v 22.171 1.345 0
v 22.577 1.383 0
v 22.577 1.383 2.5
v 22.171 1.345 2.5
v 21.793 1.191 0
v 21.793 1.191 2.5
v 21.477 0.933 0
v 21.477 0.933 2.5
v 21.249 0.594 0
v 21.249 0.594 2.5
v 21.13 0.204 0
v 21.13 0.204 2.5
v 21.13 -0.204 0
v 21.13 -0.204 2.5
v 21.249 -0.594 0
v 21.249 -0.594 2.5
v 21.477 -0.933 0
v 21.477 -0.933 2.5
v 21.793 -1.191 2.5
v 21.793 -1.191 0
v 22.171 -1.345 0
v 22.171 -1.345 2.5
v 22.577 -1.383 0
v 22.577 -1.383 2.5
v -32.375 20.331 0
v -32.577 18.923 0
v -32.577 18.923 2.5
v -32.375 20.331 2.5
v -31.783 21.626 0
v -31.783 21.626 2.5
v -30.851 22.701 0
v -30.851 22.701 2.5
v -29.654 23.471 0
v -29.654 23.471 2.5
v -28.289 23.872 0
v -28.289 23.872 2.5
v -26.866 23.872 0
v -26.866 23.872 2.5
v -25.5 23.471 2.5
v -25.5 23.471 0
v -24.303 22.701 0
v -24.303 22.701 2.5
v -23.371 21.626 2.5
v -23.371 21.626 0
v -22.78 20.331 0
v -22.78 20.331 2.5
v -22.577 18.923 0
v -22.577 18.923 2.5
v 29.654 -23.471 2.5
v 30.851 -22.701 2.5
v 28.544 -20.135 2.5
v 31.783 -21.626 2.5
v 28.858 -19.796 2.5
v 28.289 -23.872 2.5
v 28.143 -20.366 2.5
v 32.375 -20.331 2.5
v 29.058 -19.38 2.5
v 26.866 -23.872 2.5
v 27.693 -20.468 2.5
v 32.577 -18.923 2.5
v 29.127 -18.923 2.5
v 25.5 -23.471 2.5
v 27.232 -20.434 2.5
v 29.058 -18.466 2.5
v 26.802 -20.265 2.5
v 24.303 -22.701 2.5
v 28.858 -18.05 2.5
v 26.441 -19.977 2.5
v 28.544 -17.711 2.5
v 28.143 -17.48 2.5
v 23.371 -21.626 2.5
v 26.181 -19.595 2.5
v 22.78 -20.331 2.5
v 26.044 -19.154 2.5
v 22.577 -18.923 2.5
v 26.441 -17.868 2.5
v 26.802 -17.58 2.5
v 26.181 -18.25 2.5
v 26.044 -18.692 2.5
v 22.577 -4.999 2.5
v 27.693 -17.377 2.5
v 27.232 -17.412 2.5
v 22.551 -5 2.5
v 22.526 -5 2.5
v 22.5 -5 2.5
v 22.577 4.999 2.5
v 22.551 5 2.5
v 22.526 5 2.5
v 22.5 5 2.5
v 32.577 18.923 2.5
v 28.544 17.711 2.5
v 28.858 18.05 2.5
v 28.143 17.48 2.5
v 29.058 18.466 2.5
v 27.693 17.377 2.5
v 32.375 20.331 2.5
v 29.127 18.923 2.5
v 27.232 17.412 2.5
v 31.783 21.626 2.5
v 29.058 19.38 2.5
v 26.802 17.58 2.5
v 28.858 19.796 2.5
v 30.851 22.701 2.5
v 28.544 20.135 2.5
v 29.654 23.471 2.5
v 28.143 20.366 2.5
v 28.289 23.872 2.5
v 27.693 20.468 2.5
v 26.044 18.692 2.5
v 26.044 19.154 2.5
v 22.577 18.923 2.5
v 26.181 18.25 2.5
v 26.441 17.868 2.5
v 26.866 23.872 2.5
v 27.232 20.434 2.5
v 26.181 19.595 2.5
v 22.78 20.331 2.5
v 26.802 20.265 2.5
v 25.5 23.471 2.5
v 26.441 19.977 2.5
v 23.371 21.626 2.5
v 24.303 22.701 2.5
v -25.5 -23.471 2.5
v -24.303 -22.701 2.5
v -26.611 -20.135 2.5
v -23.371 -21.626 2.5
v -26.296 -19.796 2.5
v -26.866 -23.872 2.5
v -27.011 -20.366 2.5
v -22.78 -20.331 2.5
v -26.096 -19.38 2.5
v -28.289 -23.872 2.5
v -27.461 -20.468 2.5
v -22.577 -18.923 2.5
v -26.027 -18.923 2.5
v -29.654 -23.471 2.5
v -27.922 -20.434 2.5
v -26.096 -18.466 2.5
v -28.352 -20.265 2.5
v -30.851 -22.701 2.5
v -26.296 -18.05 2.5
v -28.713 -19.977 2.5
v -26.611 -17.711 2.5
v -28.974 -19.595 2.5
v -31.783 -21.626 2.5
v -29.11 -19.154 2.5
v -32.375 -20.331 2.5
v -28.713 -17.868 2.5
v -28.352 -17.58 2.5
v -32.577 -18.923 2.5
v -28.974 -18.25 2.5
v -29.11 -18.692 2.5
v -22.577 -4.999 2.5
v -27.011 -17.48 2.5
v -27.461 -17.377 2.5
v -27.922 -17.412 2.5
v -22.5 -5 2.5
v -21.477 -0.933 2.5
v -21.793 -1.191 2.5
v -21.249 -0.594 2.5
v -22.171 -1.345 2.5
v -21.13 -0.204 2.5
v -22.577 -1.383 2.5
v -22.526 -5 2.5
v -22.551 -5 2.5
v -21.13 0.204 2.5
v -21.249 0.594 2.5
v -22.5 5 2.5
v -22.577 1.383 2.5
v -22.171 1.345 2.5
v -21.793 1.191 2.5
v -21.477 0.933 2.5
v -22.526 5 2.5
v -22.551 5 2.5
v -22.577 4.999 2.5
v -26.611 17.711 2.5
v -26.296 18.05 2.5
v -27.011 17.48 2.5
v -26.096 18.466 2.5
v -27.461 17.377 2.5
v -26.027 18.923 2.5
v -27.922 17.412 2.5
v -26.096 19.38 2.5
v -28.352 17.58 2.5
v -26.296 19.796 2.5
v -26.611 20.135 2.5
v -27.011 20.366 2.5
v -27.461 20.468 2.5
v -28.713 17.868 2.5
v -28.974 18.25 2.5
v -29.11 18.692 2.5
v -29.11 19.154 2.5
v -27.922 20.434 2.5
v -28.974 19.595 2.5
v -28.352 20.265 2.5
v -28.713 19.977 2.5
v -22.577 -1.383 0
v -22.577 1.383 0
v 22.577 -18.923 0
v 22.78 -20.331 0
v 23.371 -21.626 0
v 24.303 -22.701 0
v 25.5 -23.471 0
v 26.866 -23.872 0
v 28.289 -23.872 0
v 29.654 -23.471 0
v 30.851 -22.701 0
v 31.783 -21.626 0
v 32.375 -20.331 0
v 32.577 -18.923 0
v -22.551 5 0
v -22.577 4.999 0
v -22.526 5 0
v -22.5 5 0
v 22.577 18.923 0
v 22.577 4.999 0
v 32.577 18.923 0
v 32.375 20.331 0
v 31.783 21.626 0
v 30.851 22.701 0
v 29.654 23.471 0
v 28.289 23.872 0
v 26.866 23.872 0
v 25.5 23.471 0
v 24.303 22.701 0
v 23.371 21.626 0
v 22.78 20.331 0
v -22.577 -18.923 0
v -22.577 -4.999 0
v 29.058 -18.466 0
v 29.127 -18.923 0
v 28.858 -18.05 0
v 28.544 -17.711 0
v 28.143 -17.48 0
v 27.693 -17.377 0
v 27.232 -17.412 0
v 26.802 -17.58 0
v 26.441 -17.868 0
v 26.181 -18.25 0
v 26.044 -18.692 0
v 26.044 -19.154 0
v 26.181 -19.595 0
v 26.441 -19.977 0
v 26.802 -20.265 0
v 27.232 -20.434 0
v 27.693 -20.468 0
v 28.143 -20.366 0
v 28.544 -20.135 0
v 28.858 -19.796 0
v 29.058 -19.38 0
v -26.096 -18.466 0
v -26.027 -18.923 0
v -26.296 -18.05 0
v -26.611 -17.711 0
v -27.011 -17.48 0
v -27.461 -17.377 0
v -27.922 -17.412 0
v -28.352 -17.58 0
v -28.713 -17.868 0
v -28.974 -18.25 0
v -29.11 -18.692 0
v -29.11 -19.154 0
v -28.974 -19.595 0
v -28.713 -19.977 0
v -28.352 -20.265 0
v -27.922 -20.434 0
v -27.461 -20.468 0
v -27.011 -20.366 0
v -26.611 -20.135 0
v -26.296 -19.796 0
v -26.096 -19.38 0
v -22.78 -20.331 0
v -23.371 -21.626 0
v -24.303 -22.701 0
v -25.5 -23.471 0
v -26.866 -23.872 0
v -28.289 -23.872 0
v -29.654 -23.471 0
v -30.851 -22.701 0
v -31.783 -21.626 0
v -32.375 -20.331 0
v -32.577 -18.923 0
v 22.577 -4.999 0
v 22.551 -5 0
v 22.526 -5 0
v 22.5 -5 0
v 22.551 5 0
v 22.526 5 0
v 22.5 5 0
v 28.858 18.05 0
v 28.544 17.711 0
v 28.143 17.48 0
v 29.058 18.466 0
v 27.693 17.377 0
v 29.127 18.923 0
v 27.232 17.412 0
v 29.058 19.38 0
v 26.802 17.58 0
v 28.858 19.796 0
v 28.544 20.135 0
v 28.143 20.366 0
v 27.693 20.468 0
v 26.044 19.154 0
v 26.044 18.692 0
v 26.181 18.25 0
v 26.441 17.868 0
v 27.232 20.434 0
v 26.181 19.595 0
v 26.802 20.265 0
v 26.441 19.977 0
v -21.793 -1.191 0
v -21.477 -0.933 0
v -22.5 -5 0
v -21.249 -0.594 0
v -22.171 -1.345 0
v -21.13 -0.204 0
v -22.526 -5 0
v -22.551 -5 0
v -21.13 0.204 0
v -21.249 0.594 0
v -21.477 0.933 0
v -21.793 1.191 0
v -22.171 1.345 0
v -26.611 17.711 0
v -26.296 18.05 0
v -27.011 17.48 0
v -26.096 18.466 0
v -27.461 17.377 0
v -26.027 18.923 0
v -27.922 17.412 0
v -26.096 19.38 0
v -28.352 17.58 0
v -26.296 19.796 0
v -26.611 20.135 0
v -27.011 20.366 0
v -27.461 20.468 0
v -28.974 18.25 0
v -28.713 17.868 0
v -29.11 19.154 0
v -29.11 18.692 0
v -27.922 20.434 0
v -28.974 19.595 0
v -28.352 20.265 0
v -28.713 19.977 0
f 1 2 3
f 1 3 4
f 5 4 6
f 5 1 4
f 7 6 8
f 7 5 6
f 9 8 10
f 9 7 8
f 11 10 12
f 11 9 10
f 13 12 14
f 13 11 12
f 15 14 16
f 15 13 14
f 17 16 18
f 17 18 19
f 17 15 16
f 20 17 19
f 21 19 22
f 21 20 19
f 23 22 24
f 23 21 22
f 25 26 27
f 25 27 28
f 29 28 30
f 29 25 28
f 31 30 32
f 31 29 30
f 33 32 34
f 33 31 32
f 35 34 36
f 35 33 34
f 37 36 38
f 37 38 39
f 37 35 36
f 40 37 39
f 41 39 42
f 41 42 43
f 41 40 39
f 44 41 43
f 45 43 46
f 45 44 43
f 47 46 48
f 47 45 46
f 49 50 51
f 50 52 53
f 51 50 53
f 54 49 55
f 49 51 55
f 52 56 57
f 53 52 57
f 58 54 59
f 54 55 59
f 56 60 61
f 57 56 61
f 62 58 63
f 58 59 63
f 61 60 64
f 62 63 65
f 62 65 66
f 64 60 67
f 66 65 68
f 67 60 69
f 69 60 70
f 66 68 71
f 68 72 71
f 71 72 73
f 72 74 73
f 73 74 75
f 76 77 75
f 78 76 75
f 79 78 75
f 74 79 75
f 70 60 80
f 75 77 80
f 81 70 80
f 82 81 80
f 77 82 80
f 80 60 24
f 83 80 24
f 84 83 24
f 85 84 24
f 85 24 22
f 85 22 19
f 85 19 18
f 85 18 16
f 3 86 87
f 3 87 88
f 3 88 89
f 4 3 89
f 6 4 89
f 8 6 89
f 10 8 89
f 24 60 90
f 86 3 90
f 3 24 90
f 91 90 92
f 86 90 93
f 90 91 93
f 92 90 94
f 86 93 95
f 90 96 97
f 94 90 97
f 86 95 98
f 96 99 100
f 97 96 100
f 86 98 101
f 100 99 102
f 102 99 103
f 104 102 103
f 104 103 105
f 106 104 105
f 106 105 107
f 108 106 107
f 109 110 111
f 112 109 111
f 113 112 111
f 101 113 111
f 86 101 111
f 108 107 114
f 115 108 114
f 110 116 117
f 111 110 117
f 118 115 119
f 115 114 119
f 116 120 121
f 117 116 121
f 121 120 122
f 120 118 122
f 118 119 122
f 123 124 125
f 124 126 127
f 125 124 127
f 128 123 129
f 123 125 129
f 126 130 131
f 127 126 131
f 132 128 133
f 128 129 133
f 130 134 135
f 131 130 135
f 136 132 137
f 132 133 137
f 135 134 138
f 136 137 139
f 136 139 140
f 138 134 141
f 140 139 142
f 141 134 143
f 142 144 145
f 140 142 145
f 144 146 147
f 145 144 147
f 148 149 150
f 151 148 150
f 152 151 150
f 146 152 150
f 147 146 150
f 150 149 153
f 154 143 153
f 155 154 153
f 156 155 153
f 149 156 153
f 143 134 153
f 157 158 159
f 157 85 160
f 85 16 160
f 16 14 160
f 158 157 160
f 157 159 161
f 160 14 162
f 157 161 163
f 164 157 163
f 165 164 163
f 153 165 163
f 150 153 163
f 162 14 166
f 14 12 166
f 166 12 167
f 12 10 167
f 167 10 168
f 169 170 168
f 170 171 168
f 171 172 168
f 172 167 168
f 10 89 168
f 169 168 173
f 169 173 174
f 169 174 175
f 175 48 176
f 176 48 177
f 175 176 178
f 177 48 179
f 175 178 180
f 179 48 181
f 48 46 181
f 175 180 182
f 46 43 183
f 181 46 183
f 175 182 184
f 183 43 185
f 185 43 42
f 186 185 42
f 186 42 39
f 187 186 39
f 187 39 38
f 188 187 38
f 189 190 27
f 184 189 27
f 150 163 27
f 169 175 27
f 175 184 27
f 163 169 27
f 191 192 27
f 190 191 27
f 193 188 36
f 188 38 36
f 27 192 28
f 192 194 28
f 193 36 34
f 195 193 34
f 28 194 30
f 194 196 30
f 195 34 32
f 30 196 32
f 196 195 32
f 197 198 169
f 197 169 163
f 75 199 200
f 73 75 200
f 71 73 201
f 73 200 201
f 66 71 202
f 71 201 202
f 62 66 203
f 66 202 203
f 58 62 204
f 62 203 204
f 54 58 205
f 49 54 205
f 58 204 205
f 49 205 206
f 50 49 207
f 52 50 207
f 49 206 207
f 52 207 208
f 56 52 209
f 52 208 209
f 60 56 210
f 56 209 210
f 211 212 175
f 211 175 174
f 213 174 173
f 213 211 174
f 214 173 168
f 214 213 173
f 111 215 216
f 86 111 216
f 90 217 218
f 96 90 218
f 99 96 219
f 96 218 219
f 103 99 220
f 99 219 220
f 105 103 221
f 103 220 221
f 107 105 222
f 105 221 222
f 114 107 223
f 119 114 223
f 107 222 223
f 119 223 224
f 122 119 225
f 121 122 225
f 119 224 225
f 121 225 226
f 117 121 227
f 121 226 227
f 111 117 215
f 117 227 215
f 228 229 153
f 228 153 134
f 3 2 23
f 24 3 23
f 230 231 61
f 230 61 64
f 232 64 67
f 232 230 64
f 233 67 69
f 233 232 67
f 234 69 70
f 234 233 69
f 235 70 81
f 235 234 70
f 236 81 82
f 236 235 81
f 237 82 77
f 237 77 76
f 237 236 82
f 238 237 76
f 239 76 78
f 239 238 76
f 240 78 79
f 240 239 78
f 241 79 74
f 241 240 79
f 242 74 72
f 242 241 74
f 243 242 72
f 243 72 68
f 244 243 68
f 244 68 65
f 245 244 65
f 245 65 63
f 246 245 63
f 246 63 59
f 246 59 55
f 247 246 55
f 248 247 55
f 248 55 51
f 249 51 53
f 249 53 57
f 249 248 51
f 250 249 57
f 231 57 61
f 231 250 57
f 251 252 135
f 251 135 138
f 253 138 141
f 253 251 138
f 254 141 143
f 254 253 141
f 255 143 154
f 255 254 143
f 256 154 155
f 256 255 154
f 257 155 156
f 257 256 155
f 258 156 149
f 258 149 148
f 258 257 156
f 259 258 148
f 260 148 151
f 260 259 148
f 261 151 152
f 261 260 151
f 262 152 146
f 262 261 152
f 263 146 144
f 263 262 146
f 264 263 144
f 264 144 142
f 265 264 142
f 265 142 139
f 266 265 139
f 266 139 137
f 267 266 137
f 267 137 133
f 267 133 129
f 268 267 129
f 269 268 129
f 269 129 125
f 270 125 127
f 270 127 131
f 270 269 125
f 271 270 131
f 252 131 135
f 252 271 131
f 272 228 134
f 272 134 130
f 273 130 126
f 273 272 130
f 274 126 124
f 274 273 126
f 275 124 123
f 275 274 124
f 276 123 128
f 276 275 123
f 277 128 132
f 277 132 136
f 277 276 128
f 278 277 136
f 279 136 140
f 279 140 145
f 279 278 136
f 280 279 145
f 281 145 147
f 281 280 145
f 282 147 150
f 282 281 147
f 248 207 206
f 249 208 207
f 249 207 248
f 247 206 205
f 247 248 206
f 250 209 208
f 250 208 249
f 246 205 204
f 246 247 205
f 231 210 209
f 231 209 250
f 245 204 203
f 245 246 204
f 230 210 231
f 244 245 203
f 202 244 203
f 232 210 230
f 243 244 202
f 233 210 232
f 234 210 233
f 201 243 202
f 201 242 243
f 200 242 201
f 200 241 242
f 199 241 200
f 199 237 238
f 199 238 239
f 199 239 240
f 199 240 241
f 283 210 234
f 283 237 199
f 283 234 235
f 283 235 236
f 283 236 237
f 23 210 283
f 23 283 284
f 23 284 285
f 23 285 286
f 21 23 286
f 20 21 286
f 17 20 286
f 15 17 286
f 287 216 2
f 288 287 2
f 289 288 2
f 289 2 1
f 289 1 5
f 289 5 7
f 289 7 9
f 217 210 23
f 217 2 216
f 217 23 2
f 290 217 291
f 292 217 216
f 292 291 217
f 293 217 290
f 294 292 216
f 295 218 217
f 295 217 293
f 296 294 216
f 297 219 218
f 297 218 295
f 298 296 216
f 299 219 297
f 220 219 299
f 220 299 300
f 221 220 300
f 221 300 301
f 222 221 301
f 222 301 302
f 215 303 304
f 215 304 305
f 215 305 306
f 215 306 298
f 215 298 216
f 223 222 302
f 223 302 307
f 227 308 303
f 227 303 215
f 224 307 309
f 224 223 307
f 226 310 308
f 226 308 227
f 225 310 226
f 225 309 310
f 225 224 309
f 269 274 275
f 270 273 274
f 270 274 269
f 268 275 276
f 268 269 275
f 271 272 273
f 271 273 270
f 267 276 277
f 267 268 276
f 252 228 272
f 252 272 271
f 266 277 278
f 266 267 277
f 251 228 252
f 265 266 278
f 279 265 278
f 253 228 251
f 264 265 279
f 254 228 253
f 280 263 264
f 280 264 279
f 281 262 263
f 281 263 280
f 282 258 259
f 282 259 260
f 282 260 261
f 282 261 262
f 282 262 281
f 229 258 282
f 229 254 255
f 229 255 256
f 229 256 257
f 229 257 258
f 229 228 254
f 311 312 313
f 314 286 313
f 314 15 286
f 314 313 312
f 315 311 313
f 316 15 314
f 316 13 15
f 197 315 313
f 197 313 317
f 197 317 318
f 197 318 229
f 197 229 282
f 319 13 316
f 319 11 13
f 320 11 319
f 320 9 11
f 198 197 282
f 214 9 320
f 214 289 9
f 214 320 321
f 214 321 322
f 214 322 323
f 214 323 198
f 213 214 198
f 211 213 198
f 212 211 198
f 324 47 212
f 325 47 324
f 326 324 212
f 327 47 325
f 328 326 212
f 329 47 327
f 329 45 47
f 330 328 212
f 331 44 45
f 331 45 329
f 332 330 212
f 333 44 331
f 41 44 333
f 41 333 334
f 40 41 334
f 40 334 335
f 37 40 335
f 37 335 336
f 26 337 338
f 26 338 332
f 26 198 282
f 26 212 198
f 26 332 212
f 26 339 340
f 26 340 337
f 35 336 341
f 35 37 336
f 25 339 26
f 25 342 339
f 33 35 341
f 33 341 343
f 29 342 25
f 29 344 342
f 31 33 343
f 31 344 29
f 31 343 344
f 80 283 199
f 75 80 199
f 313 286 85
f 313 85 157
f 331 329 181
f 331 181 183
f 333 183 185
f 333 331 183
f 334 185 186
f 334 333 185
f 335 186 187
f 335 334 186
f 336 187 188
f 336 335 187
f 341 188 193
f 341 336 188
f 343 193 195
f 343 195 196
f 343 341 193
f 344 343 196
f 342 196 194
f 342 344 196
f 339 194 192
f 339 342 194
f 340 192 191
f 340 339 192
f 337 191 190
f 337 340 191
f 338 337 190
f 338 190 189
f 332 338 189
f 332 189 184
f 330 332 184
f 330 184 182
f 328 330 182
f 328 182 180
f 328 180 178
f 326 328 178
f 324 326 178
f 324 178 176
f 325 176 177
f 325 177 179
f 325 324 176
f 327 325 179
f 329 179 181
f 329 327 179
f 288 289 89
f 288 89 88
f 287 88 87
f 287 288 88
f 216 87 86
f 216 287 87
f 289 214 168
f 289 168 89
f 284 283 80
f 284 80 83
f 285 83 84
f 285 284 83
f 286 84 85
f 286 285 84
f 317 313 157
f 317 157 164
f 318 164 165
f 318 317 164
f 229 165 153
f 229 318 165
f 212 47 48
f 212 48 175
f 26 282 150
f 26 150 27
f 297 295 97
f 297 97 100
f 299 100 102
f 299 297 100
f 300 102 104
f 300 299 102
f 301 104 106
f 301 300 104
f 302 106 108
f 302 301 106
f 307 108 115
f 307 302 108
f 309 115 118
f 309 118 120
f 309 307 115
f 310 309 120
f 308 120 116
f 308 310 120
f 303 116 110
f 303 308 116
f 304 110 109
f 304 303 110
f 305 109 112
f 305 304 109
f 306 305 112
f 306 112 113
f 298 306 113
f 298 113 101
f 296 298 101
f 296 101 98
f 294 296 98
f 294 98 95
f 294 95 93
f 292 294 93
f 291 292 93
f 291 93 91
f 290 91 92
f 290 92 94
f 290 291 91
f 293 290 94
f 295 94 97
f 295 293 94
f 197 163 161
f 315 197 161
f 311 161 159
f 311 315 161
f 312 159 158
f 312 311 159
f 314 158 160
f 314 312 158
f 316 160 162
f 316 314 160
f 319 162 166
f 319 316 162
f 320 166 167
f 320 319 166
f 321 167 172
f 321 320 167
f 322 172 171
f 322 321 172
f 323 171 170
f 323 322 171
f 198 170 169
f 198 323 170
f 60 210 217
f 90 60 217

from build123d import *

# Parameters (mm, degrees)
SKETCH_2_R      = 1.55
SKETCH_2_R_2    = 1.384923923
EXTRUDE_1_DEPTH = 2.5


with BuildPart() as part:
    # 草图2 → 凸台-拉伸1 (new body)
    # profile 1 of 3: a face of its own
    with BuildSketch(Plane.XY):
        with BuildLine():
            Line((-22.577164466, 18.92268553), (-22.577164466, -18.92268553))
            ThreePointArc((-22.577164466, -18.92268553), (-27.577164466, -23.92268553), (-32.577164466, -18.92268553))
            Line((-32.577164466, -18.92268553), (-32.577164466, 18.92268553))
            ThreePointArc((-32.577164466, 18.92268553), (-27.577164466, 23.92268553), (-22.577164466, 18.92268553))
        make_face()
        with Locations((-27.577164466, -18.92268553)):
            Circle(SKETCH_2_R, mode=Mode.SUBTRACT)
        with Locations((-27.577164466, 18.92268553)):
            Circle(SKETCH_2_R, mode=Mode.SUBTRACT)
    # profile 2 of 3: a face of its own
    with BuildSketch(Plane.XY):
        with BuildLine():
            Line((22.577164466, 18.92268553), (22.577164466, -18.92268553))
            ThreePointArc((22.577164466, -18.92268553), (27.577164466, -23.92268553), (32.577164466, -18.92268553))
            Line((32.577164466, -18.92268553), (32.577164466, 18.92268553))
            ThreePointArc((32.577164466, 18.92268553), (27.577164466, 23.92268553), (22.577164466, 18.92268553))
        make_face()
        with Locations((27.577164466, -18.92268553)):
            Circle(SKETCH_2_R, mode=Mode.SUBTRACT)
        with Locations((27.577164466, 18.92268553)):
            Circle(SKETCH_2_R, mode=Mode.SUBTRACT)
    # profile 3 of 3: a face of its own
    with BuildSketch(Plane.XY):
        with BuildLine():
            Line((-22.5, 5), (22.5, 5))
            ThreePointArc((22.5, 5), (27.5, 0), (22.5, -5))
            Line((22.5, -5), (-22.5, -5))
            ThreePointArc((-22.5, -5), (-27.5, 0), (-22.5, 5))
        make_face()
        with Locations((-22.5, 0)):
            Circle(SKETCH_2_R_2, mode=Mode.SUBTRACT)
        with Locations((22.5, 0)):
            Circle(SKETCH_2_R_2, mode=Mode.SUBTRACT)
    extrude(amount=EXTRUDE_1_DEPTH)


solid = part.part
